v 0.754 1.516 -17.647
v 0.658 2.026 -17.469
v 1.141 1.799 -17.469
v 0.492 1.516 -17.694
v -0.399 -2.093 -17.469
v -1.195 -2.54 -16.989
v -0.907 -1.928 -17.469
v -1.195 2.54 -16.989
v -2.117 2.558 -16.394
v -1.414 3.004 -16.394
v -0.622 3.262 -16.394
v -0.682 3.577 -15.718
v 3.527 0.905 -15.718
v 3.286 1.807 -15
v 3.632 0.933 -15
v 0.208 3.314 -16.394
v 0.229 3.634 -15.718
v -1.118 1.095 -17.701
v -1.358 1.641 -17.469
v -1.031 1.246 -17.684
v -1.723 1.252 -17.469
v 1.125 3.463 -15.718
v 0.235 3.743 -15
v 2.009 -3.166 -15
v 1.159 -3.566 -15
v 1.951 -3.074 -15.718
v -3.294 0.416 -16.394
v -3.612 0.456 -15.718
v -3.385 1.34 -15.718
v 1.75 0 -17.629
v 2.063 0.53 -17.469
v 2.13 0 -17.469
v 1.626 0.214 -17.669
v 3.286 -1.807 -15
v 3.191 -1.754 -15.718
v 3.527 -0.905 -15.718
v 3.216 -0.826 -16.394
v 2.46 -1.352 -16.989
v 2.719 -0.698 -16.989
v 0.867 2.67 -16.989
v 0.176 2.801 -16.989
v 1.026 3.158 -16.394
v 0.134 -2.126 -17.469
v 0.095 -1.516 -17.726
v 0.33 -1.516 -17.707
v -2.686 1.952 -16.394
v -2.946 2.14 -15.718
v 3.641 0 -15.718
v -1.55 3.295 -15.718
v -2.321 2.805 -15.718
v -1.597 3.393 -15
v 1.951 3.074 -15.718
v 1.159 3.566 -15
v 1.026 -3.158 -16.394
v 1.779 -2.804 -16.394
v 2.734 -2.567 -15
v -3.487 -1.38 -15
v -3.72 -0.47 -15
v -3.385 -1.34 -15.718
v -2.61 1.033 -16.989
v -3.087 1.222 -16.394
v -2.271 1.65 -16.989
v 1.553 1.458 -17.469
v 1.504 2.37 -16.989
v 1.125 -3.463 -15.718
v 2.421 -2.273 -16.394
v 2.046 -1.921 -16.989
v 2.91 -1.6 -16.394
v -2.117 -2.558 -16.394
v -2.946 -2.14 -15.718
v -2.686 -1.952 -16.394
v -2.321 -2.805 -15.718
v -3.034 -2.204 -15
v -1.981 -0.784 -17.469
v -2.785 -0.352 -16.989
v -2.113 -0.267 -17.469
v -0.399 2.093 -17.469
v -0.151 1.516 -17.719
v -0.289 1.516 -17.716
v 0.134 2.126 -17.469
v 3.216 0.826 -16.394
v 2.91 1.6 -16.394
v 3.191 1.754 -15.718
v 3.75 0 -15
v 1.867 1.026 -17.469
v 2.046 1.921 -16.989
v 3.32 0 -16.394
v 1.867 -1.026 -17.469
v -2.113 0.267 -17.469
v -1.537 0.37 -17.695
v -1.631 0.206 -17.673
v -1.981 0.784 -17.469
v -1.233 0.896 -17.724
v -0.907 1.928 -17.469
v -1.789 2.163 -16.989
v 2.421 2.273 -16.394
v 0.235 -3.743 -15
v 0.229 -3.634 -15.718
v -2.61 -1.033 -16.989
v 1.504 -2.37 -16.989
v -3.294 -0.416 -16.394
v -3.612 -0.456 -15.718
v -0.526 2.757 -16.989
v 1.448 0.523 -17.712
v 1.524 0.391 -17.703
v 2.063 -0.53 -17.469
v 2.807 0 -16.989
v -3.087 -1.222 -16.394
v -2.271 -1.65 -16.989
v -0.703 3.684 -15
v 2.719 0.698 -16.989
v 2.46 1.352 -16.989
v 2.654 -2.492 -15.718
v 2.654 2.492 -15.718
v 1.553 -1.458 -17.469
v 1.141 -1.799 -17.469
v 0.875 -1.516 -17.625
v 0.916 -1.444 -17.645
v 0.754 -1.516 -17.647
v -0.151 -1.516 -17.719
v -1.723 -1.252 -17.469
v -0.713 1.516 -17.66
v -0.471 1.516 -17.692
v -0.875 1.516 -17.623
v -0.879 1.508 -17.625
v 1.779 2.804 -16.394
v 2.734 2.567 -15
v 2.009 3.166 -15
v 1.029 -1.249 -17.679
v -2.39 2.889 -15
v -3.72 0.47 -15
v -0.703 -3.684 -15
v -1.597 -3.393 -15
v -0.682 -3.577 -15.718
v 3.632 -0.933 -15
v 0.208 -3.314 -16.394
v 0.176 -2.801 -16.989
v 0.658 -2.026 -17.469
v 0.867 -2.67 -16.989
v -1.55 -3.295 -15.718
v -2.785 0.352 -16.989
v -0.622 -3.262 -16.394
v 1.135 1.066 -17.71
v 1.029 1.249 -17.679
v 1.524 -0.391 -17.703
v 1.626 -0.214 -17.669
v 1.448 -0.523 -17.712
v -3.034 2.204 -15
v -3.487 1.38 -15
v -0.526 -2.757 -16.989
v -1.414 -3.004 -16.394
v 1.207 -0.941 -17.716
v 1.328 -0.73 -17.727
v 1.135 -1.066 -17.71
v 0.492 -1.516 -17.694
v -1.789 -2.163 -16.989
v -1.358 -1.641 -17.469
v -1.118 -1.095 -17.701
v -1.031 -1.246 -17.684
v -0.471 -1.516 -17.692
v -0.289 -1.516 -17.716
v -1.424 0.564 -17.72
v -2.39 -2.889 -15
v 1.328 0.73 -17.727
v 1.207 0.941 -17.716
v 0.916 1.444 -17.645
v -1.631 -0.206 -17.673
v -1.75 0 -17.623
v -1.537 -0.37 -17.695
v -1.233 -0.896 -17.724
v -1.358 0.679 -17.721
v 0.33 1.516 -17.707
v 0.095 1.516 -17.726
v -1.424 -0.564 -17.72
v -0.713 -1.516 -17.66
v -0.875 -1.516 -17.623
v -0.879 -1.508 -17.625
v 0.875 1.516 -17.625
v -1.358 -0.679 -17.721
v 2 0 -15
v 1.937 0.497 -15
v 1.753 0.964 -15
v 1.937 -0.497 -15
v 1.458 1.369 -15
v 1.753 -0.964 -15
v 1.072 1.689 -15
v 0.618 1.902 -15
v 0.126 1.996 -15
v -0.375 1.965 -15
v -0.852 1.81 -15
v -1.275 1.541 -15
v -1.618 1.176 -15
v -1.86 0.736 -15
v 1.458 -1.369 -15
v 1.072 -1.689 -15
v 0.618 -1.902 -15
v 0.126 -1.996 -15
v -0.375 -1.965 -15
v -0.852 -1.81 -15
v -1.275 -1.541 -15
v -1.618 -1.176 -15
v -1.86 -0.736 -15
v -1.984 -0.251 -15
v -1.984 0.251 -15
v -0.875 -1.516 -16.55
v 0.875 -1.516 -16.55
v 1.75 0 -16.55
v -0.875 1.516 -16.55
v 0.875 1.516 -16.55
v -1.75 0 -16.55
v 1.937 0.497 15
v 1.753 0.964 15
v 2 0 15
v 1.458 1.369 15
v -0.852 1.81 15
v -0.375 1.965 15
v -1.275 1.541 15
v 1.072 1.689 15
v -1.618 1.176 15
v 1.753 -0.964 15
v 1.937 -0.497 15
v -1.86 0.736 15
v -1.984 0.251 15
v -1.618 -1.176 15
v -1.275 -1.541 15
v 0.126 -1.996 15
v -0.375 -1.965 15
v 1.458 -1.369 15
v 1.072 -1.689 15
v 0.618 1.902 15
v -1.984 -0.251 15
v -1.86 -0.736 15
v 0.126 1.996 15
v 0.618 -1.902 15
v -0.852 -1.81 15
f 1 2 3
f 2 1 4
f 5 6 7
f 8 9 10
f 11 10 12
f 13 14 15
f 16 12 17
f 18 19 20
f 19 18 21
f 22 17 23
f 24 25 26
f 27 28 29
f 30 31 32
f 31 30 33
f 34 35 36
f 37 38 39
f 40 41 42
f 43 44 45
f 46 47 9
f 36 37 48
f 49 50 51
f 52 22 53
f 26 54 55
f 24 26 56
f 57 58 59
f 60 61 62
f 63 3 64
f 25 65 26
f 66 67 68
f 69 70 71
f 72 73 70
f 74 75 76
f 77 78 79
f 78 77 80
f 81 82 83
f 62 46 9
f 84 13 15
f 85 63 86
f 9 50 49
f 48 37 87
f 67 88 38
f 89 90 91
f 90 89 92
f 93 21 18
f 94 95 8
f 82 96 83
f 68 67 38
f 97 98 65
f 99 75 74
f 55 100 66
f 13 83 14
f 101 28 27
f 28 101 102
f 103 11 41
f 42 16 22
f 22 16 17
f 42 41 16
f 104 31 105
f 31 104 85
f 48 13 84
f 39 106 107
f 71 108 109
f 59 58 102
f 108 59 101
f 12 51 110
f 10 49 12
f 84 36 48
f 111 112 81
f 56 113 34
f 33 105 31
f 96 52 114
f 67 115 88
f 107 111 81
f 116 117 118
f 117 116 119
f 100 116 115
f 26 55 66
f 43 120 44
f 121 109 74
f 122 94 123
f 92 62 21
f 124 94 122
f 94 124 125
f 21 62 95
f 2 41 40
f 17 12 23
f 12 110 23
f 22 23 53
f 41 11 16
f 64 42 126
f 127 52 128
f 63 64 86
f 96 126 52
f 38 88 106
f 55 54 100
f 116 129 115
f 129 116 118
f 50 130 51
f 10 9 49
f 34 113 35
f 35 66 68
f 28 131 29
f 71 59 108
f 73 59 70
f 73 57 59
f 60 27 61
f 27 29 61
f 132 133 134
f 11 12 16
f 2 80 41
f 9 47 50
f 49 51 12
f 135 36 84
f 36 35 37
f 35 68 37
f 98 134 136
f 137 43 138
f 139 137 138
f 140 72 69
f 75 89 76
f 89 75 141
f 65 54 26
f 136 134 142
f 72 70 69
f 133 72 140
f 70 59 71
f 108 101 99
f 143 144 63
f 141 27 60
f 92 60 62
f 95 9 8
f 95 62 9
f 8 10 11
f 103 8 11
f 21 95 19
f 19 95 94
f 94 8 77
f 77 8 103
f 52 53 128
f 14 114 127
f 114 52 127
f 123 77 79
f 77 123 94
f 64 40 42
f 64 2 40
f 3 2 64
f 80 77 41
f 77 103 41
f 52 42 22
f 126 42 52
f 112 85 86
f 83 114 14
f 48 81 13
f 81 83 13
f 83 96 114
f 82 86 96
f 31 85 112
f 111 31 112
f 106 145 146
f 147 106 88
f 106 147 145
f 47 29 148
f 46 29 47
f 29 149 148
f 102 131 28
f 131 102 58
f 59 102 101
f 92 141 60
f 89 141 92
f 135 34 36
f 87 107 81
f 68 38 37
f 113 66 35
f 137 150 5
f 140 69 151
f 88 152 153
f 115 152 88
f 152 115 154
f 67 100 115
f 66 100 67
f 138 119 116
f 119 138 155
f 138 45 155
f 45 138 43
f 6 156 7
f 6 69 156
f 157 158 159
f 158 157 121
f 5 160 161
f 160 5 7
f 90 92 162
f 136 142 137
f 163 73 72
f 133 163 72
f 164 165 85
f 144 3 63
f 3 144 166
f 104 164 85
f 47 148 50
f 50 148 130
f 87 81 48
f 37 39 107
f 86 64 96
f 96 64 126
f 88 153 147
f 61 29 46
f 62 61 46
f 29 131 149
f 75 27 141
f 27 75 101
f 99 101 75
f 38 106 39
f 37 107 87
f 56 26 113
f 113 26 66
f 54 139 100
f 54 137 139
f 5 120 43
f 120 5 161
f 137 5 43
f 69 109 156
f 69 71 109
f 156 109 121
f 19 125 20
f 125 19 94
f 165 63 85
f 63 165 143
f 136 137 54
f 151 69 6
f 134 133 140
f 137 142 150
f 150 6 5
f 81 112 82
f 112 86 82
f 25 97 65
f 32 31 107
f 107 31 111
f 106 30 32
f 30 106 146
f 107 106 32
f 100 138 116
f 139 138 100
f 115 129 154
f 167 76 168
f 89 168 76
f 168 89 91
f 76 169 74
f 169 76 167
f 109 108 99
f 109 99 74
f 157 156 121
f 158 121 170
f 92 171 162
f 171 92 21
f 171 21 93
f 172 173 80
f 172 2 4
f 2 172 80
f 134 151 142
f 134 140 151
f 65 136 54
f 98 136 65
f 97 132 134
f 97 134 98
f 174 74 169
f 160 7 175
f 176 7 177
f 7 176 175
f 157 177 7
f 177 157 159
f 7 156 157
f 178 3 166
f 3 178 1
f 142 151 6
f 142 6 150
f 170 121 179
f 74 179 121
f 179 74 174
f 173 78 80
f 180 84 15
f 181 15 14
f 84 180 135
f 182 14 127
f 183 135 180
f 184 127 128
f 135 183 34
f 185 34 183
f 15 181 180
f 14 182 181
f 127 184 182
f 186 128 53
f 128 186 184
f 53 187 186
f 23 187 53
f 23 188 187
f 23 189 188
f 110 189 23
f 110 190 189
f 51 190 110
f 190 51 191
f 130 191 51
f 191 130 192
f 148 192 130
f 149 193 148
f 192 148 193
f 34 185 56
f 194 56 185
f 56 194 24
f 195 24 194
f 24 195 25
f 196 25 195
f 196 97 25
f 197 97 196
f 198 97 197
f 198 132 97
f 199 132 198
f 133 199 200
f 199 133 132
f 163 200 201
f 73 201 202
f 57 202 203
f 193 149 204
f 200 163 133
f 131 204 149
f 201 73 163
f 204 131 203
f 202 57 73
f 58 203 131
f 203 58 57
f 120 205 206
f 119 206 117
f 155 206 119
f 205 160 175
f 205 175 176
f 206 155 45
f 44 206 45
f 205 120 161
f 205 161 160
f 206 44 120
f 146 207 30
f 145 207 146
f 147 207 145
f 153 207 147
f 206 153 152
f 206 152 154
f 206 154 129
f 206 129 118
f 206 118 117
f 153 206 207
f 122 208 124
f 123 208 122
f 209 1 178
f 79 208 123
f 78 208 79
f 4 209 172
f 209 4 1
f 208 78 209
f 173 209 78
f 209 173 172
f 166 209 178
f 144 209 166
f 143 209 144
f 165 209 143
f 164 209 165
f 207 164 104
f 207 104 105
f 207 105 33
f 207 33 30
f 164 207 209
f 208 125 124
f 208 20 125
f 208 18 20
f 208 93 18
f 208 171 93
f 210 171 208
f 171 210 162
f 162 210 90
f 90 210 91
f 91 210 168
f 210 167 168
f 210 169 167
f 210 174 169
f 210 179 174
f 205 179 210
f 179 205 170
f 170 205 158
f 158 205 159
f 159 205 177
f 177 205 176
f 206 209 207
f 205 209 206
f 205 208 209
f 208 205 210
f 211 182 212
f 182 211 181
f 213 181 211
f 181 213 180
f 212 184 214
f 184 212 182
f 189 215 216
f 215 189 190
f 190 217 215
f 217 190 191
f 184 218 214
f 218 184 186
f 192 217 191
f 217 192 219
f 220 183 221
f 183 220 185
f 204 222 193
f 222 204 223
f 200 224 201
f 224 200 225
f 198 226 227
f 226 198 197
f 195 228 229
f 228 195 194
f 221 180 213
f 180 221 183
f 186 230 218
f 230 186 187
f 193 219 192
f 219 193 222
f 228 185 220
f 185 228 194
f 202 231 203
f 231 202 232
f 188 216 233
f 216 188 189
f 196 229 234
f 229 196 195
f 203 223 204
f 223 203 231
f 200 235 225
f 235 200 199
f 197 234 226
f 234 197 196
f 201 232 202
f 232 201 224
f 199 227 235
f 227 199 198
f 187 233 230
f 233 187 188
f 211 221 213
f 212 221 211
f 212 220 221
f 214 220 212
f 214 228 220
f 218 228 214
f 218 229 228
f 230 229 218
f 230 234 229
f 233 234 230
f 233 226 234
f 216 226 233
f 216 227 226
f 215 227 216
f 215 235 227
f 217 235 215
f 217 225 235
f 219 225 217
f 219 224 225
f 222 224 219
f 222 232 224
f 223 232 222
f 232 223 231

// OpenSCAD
// file: lib/screw_nuts.scad
$fn=25;

module screw_m3(h=20, button=false){
    cylinder(d=3, h=h, center=true);
    translate([0, 0, -h/2-1.5])
        difference(){
            cylinder(d=5.5, h=3, center=true);
            translate([0, 0, -0.8])
                cylinder(d=2.8, h=1.8, $fn=6, center=true);
        }
}

module screw_m4(h=20, button=false){
    cylinder(d=4, h=h, center=true);
    translate([0, 0, -h/2-2])
        difference(){
            if (button) {
                translate([0, 0, 2])
                    scale([1, 1, 6/7.5])
                    sphere(d=7.5);
            } else {
                cylinder(d=7, h=4, center=true);
            }
            if (button) {
                 translate([0, 0, 5])
                    cube([7.6, 7.6, 6], center=true);
            }
            translate([0, 0, -0.8])
                cylinder(d=3.5, h=2.5, $fn=6, center=true);
        }
}

module nut_m3(){
    difference(){
        cylinder(d=6, h=2.4, $fn=6);
        translate([0, 0, -0.05])
            cylinder(d=3, h=2.5);
    }
}

module nut_m4(){
    difference(){
        cylinder(d=7.6, h=3.2, $fn=6);
        translate([0, 0, -0.05])
            cylinder(d=4, h=3.3);
    }
}

module washer_m3(h){
    difference(){
        cylinder(d=8, h=h, center=true);
        cylinder(d=3.4, h=h+0.1, center=true);
    }
}

module washer_m5(h){
    difference(){
        cylinder(d=8, h=h, center=true);
        cylinder(d=5.4, h=h+0.1, center=true);
    }
}
// main file
// NAME: Screw M4x30 Button
// COLOR: 80
// CATEGORY: Support

include <lib/screw_nuts.scad>

color("silver")
    screw_m4(30, true);
